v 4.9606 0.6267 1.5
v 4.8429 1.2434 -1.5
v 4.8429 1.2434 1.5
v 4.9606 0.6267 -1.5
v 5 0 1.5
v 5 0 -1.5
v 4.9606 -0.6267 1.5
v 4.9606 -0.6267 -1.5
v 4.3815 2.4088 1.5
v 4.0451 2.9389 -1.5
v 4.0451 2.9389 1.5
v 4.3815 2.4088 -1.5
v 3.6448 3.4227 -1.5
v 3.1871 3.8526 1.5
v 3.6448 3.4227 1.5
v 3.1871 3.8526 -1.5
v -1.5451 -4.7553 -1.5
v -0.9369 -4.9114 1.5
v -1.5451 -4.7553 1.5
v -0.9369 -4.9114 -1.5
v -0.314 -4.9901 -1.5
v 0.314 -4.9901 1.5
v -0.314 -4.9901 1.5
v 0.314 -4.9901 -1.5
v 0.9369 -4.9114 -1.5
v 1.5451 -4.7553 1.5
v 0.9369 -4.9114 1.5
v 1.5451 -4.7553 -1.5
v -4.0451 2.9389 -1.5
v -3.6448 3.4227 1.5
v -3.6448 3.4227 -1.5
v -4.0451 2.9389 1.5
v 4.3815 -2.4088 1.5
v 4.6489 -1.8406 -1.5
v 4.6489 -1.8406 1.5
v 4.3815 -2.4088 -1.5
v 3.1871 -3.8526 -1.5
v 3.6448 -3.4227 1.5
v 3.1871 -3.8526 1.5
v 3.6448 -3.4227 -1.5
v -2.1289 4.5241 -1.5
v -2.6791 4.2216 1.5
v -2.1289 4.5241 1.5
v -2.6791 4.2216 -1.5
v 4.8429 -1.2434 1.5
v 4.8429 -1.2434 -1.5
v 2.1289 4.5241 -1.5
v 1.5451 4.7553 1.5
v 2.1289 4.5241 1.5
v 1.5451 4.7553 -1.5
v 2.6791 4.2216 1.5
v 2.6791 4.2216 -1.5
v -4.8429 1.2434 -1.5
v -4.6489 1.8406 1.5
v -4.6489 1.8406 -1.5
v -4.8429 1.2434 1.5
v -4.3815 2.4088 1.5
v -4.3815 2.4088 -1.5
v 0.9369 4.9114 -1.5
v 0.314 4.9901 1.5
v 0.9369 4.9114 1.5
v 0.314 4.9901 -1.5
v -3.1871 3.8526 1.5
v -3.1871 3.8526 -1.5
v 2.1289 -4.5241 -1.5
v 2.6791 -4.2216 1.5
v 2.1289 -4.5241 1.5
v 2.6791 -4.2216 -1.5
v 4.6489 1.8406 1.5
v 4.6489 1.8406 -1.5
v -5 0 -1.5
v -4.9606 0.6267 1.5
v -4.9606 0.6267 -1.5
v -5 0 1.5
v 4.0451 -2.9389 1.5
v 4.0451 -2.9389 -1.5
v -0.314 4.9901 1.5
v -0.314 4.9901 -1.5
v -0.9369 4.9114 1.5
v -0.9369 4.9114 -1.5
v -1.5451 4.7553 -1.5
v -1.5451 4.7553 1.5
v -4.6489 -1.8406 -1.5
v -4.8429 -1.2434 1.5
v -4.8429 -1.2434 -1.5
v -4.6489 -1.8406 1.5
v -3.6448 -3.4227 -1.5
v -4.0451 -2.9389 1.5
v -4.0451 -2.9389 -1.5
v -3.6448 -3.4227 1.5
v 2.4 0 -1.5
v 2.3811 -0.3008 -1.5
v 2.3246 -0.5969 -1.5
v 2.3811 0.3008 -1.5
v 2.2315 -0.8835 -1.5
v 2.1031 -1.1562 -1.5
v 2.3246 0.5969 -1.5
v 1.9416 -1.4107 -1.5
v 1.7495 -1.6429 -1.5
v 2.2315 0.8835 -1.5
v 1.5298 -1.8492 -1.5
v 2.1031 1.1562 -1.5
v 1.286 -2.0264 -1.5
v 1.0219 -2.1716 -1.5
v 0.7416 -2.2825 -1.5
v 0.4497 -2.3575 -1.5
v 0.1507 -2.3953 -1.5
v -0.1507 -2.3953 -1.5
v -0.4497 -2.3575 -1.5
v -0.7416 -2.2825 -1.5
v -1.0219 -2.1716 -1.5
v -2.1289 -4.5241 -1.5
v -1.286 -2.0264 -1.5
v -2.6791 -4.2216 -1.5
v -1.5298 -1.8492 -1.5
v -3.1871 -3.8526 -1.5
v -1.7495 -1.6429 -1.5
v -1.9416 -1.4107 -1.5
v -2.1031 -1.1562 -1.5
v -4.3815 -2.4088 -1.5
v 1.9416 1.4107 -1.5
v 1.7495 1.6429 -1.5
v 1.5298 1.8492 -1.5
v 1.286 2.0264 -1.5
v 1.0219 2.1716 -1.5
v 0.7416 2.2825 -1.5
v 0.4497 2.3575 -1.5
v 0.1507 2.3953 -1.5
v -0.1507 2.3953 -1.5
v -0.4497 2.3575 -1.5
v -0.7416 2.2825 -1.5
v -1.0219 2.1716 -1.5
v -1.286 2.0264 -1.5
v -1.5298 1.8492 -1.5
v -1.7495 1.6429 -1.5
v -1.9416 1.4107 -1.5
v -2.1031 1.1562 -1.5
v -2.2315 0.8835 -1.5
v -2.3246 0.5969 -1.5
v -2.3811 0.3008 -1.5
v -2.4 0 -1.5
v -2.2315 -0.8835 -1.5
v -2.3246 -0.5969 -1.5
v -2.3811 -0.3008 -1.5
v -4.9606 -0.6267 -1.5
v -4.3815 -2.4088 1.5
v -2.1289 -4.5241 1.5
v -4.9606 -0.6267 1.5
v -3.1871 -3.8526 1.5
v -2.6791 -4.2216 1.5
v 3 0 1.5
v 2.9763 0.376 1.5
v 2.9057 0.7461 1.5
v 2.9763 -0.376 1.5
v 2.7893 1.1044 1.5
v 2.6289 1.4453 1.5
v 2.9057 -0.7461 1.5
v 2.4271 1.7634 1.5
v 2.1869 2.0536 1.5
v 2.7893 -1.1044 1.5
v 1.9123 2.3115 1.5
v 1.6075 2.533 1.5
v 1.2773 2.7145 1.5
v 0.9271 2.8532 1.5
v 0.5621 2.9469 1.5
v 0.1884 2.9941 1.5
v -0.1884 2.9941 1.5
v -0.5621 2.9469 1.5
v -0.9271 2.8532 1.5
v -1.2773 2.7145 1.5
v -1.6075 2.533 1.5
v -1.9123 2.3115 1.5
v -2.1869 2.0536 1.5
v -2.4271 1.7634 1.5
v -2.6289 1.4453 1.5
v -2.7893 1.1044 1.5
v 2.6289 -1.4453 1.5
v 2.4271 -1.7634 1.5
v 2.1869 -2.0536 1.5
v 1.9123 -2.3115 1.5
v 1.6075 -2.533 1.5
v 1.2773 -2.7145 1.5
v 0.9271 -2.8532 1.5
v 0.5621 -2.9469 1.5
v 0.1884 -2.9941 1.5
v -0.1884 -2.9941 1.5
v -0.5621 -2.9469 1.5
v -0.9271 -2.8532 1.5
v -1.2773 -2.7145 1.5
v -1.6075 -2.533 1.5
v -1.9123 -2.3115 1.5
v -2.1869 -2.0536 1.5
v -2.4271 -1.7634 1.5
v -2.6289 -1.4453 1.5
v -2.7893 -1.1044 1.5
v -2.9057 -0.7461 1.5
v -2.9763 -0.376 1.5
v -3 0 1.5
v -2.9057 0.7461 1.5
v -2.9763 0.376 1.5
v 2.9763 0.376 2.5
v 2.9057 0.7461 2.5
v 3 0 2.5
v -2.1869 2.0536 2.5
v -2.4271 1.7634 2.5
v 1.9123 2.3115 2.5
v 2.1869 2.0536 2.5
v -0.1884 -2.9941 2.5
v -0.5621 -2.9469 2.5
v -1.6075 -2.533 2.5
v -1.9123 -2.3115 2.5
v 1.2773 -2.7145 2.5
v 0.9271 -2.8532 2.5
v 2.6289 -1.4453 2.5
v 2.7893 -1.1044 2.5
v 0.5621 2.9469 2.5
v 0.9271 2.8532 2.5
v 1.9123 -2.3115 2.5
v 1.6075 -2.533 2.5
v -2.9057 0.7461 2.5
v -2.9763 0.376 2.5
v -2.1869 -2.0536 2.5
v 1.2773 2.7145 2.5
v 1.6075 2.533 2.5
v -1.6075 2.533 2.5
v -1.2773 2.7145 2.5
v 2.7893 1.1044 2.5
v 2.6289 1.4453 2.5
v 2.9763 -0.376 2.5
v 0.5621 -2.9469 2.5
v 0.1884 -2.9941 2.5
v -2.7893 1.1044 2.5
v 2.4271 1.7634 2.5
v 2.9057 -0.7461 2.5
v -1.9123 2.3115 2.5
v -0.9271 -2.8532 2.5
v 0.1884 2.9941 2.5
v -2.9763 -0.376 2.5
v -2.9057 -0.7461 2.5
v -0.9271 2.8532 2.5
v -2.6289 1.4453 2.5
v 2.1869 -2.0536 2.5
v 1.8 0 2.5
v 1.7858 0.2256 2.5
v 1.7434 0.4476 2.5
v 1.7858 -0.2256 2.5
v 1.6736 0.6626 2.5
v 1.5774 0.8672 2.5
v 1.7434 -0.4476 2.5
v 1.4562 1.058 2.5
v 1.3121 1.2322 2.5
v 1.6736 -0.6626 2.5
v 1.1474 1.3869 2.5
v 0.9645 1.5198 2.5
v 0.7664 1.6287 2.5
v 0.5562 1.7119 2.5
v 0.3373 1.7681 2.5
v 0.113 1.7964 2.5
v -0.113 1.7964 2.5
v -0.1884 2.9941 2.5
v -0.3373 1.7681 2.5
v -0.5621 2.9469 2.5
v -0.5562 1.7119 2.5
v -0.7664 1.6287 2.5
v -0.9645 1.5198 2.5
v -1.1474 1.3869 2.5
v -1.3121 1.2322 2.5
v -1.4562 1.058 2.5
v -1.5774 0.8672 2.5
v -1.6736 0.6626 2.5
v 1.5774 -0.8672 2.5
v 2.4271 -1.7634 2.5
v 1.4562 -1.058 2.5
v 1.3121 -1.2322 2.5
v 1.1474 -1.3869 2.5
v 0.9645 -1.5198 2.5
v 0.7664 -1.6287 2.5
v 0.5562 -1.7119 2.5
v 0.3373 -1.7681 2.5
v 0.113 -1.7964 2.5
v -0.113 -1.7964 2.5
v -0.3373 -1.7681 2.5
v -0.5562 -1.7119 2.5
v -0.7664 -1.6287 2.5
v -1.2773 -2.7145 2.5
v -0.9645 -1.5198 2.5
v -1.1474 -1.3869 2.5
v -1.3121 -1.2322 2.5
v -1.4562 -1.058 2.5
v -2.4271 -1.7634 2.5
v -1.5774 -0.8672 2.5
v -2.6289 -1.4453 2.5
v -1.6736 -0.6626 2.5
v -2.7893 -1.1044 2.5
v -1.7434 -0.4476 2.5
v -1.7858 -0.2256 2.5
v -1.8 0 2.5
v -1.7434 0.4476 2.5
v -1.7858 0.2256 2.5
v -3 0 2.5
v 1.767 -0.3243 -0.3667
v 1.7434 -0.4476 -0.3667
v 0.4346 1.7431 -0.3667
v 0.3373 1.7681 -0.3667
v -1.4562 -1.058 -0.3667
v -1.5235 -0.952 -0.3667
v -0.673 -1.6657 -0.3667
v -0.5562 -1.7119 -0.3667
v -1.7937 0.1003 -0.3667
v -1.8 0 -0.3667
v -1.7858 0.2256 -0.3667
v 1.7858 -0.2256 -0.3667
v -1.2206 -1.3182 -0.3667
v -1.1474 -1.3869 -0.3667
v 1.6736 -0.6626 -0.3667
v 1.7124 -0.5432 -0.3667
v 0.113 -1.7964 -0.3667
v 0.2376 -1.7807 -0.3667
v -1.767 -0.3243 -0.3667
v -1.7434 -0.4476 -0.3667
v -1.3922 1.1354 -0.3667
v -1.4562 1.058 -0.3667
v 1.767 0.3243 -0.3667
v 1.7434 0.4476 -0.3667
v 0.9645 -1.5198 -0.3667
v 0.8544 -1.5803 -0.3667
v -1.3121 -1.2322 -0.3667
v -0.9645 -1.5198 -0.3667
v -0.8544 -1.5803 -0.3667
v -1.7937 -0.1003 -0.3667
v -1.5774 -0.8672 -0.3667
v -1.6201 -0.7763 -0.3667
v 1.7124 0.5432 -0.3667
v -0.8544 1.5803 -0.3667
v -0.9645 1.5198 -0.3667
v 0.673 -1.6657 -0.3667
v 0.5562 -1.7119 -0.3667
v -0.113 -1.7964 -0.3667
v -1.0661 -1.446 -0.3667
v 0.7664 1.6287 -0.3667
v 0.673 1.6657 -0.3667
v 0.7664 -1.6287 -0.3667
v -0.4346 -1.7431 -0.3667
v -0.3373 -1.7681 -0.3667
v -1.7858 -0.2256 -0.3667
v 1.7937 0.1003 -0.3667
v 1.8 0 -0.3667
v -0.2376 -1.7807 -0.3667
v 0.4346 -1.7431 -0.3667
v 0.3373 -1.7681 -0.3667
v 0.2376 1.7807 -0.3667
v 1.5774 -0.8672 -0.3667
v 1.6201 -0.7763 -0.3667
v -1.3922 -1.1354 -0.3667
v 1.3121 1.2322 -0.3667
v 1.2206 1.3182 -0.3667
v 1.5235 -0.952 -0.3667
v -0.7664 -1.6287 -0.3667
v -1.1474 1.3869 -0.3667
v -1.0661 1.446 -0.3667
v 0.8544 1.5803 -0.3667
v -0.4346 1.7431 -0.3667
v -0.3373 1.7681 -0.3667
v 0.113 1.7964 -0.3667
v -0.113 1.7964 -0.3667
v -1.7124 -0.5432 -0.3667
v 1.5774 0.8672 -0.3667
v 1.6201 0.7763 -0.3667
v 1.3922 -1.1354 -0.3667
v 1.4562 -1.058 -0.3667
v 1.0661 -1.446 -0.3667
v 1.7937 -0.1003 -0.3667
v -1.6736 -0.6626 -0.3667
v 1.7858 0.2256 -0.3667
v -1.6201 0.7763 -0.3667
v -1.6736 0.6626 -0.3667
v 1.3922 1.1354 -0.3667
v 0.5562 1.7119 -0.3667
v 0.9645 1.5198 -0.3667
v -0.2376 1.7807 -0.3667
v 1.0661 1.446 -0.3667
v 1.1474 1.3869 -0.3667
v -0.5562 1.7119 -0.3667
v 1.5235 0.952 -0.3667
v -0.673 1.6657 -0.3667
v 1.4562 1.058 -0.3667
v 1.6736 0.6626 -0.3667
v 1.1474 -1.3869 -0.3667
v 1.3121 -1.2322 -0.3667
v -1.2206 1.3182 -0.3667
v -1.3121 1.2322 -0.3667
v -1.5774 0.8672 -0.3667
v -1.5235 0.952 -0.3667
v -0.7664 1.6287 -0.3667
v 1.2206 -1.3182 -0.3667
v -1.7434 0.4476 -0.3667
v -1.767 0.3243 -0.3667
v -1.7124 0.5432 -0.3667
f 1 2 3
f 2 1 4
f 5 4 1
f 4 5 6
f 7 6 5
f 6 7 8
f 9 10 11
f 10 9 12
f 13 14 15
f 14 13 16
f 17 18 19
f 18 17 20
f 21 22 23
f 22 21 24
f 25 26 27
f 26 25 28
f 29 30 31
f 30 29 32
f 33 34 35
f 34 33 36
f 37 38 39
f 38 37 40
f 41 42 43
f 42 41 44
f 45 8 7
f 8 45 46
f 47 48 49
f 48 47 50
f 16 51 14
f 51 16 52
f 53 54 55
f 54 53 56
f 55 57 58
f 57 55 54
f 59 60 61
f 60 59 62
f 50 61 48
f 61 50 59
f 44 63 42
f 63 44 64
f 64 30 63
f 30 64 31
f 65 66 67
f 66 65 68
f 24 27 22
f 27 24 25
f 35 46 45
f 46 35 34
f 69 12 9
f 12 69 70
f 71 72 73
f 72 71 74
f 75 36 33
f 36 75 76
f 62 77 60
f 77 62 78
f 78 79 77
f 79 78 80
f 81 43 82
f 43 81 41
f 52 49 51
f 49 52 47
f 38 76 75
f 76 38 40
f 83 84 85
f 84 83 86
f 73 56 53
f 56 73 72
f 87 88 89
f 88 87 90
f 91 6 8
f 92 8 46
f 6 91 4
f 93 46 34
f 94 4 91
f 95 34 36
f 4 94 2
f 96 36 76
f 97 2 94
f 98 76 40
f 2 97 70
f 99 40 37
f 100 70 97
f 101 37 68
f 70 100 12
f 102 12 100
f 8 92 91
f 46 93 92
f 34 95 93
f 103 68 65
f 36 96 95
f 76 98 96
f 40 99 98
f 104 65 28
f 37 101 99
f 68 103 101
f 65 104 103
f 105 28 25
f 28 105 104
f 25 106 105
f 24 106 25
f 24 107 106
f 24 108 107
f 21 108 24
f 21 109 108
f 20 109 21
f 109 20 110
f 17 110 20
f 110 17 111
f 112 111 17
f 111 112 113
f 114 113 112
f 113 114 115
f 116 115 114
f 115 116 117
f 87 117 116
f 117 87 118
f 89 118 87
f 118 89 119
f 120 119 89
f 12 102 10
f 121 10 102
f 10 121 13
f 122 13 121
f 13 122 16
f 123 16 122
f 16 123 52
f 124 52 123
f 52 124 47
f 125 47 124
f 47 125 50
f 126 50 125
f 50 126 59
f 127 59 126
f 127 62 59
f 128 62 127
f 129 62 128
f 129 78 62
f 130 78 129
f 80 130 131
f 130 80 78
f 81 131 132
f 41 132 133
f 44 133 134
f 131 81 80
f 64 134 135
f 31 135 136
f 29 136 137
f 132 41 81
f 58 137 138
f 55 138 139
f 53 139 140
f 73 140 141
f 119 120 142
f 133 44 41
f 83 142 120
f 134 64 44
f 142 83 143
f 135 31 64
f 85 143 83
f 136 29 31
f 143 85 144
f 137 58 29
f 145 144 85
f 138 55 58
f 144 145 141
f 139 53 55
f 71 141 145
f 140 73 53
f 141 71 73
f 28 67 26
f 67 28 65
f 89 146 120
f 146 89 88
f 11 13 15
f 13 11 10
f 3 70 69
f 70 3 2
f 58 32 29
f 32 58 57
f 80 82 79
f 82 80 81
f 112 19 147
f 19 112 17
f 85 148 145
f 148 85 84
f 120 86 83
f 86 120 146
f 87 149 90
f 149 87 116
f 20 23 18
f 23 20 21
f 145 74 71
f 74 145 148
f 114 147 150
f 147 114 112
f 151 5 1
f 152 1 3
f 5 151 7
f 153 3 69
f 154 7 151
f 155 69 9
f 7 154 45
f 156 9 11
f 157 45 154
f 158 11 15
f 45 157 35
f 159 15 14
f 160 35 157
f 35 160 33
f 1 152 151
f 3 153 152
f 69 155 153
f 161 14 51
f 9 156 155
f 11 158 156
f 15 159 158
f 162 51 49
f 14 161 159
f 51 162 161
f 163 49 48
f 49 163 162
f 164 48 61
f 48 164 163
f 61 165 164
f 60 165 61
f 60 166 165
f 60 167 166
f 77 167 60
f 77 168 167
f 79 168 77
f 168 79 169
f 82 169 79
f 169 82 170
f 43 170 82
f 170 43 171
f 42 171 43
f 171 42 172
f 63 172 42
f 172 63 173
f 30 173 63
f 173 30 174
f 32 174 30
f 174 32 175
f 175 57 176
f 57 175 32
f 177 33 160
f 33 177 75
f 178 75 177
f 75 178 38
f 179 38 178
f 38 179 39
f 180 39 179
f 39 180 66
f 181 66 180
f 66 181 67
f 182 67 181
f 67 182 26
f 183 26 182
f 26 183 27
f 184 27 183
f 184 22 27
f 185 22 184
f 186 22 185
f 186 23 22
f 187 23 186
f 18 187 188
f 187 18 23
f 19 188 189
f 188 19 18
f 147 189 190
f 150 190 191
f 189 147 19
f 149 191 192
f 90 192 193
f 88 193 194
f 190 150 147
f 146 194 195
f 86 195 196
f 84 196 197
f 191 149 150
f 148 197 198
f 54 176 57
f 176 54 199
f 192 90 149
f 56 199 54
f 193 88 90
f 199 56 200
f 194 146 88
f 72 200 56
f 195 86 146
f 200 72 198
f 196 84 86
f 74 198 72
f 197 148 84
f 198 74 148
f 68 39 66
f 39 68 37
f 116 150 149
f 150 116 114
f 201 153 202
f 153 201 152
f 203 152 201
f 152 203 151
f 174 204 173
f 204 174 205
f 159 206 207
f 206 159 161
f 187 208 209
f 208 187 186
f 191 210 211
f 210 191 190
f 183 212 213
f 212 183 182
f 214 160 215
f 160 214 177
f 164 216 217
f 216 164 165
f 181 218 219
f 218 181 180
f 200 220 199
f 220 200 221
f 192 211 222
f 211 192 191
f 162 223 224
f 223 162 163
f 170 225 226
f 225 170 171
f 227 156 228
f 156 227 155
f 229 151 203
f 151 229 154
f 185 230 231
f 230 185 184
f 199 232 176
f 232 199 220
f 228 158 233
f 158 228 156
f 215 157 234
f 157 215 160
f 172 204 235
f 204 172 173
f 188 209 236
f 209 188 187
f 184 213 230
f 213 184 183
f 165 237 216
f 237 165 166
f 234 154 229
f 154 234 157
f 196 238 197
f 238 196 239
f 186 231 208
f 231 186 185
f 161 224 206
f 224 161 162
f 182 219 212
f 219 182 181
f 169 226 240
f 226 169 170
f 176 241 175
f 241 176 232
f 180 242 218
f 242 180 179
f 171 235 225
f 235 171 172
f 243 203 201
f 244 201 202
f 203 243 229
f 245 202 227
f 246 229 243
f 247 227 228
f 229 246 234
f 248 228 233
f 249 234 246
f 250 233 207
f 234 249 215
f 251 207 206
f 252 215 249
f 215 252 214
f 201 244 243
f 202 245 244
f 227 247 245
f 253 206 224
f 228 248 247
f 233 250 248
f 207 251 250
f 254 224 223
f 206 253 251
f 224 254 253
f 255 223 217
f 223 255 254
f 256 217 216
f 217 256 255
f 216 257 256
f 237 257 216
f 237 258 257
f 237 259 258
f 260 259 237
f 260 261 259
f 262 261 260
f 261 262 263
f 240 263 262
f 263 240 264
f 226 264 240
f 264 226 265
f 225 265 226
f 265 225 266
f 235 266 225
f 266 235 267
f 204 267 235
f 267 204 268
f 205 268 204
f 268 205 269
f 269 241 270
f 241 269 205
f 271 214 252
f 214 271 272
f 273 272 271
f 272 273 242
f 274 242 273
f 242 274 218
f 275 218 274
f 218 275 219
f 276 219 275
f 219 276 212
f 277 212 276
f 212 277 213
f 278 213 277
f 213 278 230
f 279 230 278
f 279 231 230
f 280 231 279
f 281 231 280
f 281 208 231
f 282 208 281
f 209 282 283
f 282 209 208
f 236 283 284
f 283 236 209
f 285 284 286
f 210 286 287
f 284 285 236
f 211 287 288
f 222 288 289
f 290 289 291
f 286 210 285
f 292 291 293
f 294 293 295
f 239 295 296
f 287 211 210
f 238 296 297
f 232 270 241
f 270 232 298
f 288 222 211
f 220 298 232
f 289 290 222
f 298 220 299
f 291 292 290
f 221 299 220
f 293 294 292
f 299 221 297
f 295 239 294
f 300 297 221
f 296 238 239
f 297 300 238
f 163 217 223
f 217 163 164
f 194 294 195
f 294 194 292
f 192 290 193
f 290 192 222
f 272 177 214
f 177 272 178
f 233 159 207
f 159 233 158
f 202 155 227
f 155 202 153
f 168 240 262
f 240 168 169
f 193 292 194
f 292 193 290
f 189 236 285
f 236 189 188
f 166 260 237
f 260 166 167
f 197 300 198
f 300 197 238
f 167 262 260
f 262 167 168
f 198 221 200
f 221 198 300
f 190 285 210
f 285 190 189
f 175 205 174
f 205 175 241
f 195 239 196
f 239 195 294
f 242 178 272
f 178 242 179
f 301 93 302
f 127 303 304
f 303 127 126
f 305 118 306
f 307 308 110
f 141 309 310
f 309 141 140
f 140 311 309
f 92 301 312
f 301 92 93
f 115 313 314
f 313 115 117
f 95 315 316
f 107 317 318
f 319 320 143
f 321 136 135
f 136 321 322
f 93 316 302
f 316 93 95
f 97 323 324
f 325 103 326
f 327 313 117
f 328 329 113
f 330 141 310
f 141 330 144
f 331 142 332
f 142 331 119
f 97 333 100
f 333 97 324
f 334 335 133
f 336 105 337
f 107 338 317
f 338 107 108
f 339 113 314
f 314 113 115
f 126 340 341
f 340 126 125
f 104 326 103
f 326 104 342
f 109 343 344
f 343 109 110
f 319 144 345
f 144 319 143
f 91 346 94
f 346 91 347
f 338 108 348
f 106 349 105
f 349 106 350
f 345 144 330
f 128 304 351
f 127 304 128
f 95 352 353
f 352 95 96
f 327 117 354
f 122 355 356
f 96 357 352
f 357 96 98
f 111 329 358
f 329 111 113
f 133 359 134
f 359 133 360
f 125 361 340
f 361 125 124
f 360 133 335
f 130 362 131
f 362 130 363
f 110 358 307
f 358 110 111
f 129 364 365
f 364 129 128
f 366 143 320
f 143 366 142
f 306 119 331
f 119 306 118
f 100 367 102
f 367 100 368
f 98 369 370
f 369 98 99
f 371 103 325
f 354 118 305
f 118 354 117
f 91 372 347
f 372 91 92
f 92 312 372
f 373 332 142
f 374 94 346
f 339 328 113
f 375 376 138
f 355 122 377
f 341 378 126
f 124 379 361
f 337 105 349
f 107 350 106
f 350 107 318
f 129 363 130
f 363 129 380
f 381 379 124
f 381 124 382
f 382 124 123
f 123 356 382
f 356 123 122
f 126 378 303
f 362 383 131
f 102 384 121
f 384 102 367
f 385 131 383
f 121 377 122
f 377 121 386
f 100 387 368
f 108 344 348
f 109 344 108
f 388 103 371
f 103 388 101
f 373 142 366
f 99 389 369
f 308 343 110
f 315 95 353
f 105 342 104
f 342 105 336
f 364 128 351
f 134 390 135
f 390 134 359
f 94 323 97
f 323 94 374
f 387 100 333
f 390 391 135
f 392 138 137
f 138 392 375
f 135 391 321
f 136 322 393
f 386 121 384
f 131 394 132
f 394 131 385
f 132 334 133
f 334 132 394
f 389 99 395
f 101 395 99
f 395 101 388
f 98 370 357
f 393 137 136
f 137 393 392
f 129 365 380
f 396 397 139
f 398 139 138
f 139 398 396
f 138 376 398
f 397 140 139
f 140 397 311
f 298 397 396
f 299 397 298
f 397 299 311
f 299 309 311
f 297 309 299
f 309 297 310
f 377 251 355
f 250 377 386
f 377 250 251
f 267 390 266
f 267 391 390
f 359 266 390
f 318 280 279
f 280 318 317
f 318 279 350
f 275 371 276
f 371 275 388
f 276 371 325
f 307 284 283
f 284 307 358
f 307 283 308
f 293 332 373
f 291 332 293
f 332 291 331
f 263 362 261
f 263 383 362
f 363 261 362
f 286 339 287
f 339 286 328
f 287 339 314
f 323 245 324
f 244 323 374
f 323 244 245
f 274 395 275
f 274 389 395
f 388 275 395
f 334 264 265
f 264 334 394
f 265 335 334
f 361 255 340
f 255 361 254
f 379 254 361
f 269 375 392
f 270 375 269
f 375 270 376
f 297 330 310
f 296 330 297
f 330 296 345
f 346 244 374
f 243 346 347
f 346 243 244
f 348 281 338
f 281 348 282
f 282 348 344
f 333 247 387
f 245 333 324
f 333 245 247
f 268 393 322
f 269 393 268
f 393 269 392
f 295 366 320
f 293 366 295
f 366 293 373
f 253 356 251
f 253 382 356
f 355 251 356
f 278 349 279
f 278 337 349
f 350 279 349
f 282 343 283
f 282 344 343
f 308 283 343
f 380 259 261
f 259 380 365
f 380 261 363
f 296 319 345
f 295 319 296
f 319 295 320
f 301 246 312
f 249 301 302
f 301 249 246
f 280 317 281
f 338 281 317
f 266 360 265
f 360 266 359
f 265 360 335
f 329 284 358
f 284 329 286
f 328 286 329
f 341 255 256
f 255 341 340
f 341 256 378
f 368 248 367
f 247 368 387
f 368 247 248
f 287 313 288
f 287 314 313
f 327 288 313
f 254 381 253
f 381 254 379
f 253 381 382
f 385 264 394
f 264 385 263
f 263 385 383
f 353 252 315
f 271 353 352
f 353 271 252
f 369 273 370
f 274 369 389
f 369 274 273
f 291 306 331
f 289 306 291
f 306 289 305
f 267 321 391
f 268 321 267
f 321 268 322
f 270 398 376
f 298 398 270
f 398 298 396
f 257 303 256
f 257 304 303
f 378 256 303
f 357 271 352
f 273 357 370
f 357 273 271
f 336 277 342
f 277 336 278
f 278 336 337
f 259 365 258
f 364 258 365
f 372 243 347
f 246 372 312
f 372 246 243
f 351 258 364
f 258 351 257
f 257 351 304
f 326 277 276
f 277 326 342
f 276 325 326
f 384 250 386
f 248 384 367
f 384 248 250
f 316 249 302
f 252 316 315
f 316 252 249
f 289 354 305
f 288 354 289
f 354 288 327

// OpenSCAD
$fn = 50;


difference() {
	union() {
		translate(v = [0, 0, -1.5000000000]) {
			cylinder(h = 3, r = 5.0000000000);
		}
		translate(v = [0, 0, -1.5000000000]) {
			cylinder(h = 4, r = 3.0000000000);
		}
	}
	union() {
		translate(v = [0, 0, -1.5000000000]) {
			rotate(a = [0, 180, 0]) {
				difference() {
					union() {
						translate(v = [0, 0, -1.7000000000]) {
							cylinder(h = 1.7000000000, r1 = 1.5000000000, r2 = 2.4000000000);
						}
						translate(v = [0, 0, -4.0000000000]) {
							cylinder(h = 4, r = 1.5000000000);
						}
						translate(v = [0, 0, -4.0000000000]) {
							cylinder(h = 4, r = 1.8000000000);
						}
						translate(v = [0, 0, -4.0000000000]) {
							cylinder(h = 4, r = 1.5000000000);
						}
					}
					union();
				}
			}
		}
		translate(v = [0, 0, -100.0000000000]) {
			cylinder(h = 200, r = 1.5000000000);
		}
	}
}
